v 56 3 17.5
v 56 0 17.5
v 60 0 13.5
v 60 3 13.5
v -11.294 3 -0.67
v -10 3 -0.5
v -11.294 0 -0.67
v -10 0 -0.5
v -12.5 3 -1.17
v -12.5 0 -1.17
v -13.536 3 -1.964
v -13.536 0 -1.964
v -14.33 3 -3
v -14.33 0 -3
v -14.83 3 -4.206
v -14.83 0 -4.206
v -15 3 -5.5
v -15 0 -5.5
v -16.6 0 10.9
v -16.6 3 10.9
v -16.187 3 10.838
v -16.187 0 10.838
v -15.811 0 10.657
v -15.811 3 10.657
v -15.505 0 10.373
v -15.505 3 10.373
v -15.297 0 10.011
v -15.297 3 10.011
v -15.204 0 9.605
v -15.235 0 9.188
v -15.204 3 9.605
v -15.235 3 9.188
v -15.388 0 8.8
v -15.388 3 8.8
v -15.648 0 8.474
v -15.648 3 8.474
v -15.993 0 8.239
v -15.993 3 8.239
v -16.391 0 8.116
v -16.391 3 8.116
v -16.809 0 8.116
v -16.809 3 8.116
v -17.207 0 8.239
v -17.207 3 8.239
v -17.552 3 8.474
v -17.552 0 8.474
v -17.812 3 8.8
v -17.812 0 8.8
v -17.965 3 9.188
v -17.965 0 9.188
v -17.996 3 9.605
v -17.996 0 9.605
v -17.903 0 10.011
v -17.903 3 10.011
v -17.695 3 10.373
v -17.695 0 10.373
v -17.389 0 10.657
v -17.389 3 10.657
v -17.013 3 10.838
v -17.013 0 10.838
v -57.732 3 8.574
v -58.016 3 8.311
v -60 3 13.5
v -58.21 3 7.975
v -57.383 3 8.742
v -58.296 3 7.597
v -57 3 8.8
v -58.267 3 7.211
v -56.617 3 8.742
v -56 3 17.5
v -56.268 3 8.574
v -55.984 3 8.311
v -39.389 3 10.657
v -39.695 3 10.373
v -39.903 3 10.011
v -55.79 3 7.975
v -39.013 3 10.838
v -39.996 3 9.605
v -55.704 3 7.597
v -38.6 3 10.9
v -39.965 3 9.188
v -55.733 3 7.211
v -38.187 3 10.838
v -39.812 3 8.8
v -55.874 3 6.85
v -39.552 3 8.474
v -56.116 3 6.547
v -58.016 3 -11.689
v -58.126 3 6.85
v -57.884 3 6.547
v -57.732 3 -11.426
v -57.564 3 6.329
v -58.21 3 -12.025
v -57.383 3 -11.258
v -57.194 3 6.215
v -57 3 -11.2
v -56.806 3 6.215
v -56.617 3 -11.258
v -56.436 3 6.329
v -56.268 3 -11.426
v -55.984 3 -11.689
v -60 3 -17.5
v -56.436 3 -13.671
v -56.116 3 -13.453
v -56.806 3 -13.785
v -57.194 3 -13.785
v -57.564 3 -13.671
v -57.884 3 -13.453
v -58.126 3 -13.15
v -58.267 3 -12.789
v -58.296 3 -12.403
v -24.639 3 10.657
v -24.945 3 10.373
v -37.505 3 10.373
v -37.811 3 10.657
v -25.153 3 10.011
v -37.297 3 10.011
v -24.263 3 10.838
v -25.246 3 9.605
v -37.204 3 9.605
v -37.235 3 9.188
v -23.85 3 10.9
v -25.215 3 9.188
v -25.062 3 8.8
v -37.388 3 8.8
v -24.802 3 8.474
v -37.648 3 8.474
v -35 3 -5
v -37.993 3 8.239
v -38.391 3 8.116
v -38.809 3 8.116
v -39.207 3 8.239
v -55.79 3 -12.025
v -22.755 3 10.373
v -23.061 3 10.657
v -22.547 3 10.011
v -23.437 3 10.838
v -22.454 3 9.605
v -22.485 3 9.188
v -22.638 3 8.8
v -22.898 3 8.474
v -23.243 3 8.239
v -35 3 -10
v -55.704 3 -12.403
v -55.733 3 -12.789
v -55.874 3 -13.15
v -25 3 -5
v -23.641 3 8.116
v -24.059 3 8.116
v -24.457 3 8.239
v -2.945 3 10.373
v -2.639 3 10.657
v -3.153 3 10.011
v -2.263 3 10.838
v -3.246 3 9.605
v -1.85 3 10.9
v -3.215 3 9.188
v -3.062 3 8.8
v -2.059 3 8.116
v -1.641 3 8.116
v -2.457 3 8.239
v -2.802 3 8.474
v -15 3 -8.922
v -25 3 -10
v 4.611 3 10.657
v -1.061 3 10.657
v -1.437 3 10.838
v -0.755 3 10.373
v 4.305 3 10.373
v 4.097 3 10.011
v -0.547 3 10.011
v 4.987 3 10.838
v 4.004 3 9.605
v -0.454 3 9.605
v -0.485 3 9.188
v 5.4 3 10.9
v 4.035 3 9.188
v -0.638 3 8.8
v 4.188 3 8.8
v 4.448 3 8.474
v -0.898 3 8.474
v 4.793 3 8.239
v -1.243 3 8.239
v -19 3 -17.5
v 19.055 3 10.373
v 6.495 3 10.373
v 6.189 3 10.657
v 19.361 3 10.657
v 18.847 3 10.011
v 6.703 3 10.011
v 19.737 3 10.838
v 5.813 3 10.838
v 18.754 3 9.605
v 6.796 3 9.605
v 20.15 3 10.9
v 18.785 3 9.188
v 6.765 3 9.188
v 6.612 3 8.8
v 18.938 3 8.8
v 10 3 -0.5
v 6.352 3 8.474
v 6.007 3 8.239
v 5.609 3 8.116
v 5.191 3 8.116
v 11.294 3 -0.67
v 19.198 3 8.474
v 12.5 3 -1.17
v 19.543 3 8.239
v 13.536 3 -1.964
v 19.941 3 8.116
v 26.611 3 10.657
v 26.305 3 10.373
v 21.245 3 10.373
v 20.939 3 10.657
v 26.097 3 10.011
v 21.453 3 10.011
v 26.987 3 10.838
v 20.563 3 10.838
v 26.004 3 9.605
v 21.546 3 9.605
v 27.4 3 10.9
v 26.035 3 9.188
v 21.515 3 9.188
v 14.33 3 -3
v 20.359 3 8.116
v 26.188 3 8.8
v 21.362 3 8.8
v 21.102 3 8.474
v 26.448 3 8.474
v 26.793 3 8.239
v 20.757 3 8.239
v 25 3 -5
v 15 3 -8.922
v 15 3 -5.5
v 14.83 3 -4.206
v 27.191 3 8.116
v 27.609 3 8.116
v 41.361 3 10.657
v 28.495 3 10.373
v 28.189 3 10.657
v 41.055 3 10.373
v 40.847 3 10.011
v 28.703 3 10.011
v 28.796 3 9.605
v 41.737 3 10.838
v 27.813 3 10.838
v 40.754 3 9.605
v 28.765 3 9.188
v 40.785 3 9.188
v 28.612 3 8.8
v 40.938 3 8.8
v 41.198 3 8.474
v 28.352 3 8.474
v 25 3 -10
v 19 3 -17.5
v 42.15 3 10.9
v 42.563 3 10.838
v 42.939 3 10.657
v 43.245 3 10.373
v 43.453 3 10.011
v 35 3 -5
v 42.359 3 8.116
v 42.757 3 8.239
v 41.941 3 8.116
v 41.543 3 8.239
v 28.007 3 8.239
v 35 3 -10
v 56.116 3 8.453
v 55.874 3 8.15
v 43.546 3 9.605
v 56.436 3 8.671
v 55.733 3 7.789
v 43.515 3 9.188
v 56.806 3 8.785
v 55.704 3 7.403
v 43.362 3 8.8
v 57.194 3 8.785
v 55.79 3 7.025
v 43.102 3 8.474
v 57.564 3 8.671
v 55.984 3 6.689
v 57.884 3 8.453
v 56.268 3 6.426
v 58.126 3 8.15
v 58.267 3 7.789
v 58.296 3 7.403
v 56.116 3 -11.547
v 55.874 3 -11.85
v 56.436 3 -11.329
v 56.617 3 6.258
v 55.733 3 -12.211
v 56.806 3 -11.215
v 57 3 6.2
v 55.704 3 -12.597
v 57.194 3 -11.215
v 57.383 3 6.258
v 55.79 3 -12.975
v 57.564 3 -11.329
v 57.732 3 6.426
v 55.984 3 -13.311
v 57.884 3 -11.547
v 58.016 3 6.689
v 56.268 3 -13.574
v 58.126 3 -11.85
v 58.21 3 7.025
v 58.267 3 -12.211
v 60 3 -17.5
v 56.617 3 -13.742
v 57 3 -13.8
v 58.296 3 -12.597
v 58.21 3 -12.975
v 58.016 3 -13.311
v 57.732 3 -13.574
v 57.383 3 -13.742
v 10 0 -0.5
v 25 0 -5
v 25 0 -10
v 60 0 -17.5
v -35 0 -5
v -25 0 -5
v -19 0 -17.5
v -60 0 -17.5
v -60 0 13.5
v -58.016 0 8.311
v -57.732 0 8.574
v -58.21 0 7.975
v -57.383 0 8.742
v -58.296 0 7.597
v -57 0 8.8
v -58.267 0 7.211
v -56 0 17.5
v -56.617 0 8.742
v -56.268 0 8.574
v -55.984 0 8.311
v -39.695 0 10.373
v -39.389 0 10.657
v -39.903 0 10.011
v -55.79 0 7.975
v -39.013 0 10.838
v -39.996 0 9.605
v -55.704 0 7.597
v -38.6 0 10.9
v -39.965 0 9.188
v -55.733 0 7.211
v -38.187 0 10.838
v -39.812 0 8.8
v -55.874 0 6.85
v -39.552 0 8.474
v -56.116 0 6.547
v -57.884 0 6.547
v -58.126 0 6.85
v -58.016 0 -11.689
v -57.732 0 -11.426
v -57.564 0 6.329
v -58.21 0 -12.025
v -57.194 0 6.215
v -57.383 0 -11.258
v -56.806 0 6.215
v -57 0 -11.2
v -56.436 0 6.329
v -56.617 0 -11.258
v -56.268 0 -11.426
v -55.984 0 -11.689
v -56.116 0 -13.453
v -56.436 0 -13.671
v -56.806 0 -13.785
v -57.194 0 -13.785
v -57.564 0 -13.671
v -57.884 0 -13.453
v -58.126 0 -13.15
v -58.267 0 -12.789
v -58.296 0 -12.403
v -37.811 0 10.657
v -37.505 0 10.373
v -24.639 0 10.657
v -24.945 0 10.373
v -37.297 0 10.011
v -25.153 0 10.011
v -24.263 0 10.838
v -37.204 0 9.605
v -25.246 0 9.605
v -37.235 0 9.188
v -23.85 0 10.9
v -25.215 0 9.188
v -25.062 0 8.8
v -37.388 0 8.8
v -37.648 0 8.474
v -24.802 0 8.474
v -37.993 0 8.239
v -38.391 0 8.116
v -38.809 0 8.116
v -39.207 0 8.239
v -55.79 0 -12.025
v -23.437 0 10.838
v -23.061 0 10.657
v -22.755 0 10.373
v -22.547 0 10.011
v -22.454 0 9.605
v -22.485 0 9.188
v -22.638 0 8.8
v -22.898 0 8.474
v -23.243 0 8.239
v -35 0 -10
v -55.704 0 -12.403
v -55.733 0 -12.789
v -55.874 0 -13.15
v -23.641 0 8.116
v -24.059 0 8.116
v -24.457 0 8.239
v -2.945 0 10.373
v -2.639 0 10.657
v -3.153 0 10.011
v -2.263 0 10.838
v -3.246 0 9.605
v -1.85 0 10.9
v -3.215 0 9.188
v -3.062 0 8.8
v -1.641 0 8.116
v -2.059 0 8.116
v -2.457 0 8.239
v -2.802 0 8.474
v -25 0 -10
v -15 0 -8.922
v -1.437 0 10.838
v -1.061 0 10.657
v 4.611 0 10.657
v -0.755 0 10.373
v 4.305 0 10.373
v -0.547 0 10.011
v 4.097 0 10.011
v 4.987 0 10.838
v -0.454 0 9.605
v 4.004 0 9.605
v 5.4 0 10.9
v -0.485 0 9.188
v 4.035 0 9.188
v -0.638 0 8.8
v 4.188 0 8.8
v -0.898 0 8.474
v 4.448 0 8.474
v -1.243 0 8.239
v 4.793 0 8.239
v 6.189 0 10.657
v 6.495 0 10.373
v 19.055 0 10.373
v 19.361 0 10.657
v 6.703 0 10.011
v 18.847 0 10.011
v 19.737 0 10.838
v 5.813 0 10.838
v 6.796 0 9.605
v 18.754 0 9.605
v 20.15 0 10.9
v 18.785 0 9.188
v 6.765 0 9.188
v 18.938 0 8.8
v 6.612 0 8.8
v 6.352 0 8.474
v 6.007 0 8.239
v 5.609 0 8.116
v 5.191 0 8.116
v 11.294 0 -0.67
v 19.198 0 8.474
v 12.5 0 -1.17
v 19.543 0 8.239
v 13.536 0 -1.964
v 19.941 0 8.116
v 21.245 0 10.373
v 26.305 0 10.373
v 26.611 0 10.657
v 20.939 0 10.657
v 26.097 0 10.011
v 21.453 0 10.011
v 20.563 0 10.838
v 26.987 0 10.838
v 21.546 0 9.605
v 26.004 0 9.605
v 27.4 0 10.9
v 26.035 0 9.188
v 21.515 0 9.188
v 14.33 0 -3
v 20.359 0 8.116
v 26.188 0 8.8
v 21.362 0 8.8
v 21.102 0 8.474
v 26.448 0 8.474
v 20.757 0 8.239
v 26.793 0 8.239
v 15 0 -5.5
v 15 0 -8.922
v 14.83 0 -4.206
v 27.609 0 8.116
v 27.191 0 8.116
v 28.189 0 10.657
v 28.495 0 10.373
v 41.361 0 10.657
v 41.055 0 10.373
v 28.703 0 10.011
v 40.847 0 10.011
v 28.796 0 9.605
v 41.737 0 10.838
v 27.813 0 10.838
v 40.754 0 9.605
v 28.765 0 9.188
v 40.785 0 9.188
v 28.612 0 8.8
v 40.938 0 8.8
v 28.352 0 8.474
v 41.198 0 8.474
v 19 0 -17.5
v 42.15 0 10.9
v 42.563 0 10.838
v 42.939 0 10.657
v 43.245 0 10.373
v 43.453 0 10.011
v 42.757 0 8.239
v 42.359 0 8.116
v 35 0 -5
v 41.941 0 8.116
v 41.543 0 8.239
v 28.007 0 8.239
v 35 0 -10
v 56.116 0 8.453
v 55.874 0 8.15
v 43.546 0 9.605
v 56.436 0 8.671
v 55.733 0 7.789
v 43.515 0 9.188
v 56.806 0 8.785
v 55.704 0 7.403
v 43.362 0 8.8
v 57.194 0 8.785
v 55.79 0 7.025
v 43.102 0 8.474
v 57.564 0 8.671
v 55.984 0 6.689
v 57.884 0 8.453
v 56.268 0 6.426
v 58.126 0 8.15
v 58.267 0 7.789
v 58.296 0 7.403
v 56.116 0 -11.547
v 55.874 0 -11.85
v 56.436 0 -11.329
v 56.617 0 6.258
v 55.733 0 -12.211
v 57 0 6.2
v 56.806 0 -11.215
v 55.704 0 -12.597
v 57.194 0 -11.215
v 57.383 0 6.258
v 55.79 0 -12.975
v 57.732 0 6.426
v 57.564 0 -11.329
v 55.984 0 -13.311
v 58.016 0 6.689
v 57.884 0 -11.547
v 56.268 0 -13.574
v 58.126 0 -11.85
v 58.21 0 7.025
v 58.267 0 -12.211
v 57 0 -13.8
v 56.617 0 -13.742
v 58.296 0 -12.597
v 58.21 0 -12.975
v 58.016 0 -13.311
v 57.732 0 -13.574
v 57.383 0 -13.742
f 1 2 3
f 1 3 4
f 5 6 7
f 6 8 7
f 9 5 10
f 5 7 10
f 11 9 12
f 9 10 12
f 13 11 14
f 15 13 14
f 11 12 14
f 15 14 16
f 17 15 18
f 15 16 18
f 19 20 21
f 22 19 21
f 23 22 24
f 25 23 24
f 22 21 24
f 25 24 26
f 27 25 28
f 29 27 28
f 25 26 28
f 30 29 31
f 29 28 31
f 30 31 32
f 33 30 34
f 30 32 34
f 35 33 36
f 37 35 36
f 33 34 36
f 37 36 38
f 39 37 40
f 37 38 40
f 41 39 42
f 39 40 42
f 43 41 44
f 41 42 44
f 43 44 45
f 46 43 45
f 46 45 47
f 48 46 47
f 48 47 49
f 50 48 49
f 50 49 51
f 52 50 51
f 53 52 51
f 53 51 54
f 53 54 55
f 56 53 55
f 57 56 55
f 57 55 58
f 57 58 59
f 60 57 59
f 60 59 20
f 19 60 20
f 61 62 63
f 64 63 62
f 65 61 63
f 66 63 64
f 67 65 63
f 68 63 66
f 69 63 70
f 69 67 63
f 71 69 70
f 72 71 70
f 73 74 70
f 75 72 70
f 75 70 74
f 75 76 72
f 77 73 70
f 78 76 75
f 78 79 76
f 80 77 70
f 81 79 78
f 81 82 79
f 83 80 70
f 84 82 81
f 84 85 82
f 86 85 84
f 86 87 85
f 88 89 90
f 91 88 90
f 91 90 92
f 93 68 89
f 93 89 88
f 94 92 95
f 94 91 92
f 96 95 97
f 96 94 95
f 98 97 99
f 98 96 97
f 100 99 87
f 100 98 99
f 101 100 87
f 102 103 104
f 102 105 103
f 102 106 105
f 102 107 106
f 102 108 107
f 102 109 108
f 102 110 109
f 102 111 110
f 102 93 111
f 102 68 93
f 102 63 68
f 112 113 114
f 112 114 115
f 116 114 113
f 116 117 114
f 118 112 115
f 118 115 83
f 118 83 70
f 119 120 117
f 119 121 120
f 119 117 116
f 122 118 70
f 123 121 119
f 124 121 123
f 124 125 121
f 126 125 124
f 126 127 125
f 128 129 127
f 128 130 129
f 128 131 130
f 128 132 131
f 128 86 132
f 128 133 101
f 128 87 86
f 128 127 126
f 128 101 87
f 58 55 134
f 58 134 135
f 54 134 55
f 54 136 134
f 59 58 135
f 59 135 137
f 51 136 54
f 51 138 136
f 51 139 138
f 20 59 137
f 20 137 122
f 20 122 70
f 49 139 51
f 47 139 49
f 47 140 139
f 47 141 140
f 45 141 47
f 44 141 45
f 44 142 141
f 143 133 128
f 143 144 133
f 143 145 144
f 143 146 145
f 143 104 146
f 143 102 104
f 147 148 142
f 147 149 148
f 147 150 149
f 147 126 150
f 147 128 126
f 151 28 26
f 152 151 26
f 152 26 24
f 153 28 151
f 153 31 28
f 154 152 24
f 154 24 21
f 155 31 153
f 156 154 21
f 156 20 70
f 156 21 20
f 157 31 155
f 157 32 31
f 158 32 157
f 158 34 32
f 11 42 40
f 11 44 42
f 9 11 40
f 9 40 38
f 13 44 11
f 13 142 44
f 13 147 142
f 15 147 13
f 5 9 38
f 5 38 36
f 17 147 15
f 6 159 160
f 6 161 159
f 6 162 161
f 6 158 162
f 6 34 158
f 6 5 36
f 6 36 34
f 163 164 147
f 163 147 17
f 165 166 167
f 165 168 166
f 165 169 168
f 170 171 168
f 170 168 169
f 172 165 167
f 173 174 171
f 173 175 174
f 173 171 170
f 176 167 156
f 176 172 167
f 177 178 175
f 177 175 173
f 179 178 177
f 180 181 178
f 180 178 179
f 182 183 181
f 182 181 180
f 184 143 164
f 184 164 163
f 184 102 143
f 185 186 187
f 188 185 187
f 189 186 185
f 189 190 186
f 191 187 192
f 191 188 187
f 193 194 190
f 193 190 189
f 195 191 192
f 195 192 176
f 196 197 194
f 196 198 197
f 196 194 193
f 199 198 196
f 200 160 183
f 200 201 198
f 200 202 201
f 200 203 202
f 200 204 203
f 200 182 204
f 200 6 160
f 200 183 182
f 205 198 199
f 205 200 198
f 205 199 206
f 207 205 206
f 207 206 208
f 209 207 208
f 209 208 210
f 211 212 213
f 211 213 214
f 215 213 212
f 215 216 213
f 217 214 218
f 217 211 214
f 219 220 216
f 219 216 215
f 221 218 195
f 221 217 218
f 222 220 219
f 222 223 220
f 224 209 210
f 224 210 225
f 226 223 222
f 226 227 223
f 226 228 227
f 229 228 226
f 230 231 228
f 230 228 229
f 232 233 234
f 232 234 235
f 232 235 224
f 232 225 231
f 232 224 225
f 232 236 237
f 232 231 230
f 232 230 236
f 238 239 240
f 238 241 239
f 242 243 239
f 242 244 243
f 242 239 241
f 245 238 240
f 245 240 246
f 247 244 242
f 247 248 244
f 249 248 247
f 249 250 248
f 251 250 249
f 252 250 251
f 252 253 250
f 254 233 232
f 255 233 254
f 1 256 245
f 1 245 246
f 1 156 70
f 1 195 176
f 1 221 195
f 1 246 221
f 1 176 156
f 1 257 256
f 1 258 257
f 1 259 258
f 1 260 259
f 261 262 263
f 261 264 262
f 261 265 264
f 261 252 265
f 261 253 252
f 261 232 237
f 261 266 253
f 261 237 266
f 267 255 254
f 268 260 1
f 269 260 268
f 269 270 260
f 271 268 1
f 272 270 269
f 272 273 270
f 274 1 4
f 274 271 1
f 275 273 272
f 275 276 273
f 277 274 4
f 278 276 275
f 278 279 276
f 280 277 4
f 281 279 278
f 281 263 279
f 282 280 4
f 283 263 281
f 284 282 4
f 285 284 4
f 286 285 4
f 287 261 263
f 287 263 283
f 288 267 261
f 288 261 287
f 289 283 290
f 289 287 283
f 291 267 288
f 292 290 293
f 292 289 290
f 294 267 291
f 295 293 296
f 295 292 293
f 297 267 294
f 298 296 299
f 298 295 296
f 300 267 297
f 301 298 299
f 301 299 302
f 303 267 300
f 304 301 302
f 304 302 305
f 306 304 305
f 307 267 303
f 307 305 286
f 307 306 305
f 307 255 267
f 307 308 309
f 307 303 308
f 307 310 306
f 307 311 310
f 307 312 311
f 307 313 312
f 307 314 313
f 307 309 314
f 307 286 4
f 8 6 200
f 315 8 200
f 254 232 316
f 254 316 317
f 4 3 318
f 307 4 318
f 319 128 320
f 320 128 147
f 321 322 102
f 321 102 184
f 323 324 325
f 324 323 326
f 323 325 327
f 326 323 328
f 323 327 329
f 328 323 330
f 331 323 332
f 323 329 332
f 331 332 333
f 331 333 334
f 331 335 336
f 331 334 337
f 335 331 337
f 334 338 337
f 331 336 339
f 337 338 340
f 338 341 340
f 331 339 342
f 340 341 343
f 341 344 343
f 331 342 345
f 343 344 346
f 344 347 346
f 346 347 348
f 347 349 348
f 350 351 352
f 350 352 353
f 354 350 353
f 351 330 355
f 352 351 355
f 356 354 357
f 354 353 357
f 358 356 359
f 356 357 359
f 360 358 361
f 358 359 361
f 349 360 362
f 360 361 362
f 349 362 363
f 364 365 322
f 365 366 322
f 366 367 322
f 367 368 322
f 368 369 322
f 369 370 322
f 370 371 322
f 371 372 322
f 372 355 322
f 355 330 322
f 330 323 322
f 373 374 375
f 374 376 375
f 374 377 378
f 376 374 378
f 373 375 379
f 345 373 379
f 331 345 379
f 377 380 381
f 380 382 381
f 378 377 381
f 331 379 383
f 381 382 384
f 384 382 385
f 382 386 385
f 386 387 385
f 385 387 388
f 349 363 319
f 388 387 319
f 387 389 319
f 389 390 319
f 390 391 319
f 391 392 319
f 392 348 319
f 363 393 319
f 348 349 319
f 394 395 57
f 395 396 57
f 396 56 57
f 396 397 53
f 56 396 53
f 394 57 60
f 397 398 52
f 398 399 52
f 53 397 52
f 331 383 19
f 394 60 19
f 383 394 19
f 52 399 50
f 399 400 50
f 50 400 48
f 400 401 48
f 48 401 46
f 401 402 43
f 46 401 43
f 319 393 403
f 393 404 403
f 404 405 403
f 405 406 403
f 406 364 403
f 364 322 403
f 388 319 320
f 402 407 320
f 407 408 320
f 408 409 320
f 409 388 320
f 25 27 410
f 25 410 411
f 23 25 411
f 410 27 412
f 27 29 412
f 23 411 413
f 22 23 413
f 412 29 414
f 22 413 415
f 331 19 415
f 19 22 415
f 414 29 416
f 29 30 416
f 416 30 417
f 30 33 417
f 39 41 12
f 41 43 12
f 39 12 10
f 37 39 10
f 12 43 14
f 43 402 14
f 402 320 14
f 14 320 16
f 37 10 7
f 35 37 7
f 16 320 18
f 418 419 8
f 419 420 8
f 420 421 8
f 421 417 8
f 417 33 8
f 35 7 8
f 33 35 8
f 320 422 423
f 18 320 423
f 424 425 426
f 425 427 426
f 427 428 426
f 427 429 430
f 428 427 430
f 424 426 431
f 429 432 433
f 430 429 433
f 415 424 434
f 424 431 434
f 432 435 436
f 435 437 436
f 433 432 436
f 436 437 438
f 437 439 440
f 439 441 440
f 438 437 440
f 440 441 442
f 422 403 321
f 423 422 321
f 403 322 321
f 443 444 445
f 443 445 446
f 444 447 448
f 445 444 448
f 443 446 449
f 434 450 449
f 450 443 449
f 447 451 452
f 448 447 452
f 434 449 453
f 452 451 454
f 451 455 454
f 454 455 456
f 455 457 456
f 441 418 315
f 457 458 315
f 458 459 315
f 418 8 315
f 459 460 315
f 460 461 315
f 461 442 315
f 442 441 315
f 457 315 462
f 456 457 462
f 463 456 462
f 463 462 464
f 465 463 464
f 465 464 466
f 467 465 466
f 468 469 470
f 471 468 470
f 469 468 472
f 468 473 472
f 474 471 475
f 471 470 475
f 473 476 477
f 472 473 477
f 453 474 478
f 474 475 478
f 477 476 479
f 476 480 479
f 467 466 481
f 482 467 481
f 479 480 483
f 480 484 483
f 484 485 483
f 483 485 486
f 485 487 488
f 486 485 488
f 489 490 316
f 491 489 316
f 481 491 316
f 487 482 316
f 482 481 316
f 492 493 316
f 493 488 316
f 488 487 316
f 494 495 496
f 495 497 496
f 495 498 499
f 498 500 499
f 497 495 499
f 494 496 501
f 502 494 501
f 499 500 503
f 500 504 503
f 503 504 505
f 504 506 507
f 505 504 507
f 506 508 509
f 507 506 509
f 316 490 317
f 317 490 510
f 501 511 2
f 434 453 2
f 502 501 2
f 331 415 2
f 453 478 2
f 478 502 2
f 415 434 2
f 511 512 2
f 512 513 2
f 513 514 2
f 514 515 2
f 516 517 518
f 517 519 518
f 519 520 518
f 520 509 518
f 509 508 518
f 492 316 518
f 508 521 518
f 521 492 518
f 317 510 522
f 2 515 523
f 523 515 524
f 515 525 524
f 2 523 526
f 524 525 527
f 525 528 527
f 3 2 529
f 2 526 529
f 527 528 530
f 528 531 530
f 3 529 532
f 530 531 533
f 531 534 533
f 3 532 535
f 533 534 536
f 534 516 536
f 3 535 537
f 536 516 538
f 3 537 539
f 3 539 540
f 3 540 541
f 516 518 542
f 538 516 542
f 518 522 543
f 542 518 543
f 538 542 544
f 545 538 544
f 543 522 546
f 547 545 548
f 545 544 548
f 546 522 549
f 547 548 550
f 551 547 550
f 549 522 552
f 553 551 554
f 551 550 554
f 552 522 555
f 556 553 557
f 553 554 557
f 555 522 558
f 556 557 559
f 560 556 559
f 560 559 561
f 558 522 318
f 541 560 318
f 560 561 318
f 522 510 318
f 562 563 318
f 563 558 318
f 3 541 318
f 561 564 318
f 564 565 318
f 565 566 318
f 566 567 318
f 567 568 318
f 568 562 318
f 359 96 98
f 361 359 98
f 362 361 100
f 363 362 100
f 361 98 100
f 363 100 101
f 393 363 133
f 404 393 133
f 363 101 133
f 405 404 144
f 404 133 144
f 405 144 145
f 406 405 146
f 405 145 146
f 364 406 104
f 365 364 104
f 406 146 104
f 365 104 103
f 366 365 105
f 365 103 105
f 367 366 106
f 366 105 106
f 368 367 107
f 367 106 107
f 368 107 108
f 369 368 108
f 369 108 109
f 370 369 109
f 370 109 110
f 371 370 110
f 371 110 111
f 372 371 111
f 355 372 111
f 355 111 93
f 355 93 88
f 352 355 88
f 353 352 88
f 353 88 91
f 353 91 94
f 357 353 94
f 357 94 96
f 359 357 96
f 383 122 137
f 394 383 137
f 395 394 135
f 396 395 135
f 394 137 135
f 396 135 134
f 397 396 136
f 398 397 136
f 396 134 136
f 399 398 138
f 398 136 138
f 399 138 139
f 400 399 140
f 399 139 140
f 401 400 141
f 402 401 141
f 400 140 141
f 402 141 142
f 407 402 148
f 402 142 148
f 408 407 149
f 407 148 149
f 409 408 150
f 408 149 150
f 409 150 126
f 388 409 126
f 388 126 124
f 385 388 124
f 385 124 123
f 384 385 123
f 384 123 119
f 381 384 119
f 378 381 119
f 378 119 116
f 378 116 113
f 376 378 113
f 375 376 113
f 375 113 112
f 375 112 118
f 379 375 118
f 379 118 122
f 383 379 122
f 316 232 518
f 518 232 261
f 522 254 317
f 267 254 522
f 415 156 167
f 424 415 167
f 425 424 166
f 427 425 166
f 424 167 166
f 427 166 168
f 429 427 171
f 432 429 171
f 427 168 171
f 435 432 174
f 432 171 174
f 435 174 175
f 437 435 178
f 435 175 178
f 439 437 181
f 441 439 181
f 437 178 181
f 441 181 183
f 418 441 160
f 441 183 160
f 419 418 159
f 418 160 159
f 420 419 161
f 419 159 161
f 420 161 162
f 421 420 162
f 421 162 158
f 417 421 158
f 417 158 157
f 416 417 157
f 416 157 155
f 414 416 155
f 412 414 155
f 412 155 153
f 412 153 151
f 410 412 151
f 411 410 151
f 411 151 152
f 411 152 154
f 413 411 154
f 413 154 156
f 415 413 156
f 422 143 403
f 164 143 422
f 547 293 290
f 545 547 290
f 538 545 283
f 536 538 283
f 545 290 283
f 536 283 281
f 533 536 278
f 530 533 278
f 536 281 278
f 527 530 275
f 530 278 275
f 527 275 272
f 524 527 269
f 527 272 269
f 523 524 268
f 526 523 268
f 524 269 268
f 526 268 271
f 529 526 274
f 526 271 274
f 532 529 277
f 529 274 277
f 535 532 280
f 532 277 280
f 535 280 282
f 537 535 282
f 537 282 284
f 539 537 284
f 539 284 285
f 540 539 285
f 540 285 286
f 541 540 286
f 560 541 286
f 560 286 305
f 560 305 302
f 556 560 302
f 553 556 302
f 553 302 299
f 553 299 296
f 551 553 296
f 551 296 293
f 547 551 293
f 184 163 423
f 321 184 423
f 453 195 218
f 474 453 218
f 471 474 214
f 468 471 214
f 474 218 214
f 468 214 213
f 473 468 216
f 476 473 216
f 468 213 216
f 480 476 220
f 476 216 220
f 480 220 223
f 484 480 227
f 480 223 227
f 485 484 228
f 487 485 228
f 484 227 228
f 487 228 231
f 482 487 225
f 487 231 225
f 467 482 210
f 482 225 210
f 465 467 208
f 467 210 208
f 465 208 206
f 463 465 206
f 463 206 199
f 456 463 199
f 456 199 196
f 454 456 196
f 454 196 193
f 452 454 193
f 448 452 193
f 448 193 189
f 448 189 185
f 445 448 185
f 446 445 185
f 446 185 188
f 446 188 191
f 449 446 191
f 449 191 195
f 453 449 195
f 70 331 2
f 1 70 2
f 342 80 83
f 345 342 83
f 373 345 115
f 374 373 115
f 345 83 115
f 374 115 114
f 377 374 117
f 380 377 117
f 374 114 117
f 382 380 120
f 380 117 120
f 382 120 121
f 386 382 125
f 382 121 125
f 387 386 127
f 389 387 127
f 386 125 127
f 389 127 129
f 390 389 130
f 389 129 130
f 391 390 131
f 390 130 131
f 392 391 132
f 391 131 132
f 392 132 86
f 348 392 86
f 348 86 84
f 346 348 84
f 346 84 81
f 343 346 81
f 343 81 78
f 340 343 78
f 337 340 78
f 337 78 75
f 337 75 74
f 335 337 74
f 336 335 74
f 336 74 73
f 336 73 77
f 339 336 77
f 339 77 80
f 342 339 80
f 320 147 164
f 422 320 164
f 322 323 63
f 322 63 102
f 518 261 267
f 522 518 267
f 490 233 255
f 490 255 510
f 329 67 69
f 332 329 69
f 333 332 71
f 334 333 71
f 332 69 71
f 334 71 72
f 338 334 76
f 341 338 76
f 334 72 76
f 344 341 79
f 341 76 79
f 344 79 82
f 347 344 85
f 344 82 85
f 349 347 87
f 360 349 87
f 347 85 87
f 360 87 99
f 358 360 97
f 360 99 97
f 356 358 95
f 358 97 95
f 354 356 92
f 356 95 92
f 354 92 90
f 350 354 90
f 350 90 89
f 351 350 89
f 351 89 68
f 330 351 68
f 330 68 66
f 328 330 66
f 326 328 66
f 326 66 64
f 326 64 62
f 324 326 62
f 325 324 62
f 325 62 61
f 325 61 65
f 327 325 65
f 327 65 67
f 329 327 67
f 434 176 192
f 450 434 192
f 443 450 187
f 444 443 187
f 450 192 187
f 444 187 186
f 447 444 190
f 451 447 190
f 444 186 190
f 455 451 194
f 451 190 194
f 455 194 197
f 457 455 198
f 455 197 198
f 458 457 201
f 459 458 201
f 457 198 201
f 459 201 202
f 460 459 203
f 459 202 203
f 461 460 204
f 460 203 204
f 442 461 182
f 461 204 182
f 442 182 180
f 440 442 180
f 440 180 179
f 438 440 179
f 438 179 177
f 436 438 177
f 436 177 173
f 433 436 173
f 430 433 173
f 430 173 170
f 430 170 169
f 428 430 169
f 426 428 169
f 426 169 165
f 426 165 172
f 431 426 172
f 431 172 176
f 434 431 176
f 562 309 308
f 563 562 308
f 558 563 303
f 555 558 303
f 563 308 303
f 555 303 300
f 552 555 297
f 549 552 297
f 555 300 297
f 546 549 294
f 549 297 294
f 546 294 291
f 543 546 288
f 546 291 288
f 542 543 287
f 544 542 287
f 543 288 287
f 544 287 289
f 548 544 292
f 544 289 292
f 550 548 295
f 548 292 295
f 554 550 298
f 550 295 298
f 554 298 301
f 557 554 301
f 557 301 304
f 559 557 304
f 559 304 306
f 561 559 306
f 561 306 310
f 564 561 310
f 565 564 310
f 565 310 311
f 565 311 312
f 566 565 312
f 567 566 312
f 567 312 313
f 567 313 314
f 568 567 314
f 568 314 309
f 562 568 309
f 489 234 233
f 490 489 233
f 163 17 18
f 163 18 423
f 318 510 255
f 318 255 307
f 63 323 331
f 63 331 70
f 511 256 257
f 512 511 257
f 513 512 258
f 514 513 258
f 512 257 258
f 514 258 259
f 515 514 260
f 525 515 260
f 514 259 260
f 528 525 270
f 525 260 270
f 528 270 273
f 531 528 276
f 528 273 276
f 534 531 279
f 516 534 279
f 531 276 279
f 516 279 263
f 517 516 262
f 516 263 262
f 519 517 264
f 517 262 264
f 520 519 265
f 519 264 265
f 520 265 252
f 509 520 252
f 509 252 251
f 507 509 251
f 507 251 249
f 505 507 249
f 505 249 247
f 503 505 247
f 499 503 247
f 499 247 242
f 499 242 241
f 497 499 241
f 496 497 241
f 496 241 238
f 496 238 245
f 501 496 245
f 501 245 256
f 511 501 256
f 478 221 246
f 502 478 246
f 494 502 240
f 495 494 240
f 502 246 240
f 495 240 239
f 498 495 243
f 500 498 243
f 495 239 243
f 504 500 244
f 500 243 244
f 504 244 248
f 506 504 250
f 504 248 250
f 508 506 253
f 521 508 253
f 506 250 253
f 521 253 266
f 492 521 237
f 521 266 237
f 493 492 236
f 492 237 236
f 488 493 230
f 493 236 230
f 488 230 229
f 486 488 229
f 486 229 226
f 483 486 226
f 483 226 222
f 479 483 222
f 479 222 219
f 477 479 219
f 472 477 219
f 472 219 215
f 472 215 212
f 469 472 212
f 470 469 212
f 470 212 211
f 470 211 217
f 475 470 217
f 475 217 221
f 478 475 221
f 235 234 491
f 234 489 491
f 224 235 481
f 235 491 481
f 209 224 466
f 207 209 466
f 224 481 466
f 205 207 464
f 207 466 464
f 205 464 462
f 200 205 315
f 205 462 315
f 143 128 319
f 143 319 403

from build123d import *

# Parameters (mm, degrees)
SKETCH_1_W          = 120
SKETCH_1_H          = 35
EXTRUDE_1_DEPTH     = 3
SKETCH_2_W          = 30
SKETCH_2_H          = 17
CUT_EXTRUDE_1_DEPTH = 63.571958576
SKETCH_3_R          = 1.3
CUT_EXTRUDE_2_DEPTH = 63.571958576
SKETCH_4_R          = 1.4
CUT_EXTRUDE_3_DEPTH = 63.571958576
SKETCH_5_W          = 10
SKETCH_5_H          = 5
CUT_EXTRUDE_4_DEPTH = 63.571958576
CHAMFER_1_SIZE      = 4
CHAMFER_1_SIZE2     = 8.578027682
CHAMFER_2_SIZE      = 4
CHAMFER_2_SIZE2     = 8.578027682
FILLET_1_R          = 5
CHAMFER_3_SIZE      = 4


with BuildPart() as part:
    # 草图1 → 凸台-拉伸1 (new body)
    with BuildSketch(Plane(origin=(0, 0, 0), x_dir=(1, 0, 0), z_dir=(0, 1, 0))):
        Rectangle(SKETCH_1_W, SKETCH_1_H)
    extrude(amount=EXTRUDE_1_DEPTH)

    # 草图2 → 切除-拉伸1 (cut, through all)
    with BuildSketch(Plane(origin=(0, 3, 0), x_dir=(1, 0, 0), z_dir=(0, 1, 0))):
        with Locations((0, 9)):
            Rectangle(SKETCH_2_W, SKETCH_2_H)
    extrude(amount=-CUT_EXTRUDE_1_DEPTH, mode=Mode.SUBTRACT)

    # 草图3 → 切除-拉伸2 (cut, through all)
    with BuildSketch(Plane(origin=(0, 3, 0), x_dir=(1, 0, 0), z_dir=(0, 1, 0))):
        with Locations(Location((-57, 12.5, 0), (0, 0, 270))):
            Circle(SKETCH_3_R)
        with Locations(Location((-57, -7.5, 0), (0, 0, 270))):
            Circle(SKETCH_3_R)
        with Locations(Location((57, -7.5, 0), (0, 0, 90))):
            Circle(SKETCH_3_R)
        with Locations(Location((57, 12.5, 0), (0, 0, 90))):
            Circle(SKETCH_3_R)
    extrude(amount=-CUT_EXTRUDE_2_DEPTH, mode=Mode.SUBTRACT)

    # 草图4 → 切除-拉伸3 (cut, through all)
    with BuildSketch(Plane(origin=(0, 3, 0), x_dir=(1, 0, 0), z_dir=(0, 1, 0))):
        with Locations(Location((5.4, -9.5, 0), (0, 0, 270))):
            Circle(SKETCH_4_R)
        with Locations(Location((20.15, -9.5, 0), (0, 0, 270))):
            Circle(SKETCH_4_R)
        with Locations(Location((27.4, -9.5, 0), (0, 0, 270))):
            Circle(SKETCH_4_R)
        with Locations(Location((42.15, -9.5, 0), (0, 0, 270))):
            Circle(SKETCH_4_R)
        with Locations(Location((-1.85, -9.5, 0), (0, 0, 270))):
            Circle(SKETCH_4_R)
        with Locations(Location((-16.6, -9.5, 0), (0, 0, 270))):
            Circle(SKETCH_4_R)
        with Locations(Location((-23.85, -9.5, 0), (0, 0, 270))):
            Circle(SKETCH_4_R)
        with Locations(Location((-38.6, -9.5, 0), (0, 0, 270))):
            Circle(SKETCH_4_R)
    extrude(amount=-CUT_EXTRUDE_3_DEPTH, mode=Mode.SUBTRACT)

    # 草图5 → 切除-拉伸4 (cut, through all)
    with BuildSketch(Plane(origin=(0, 3, 0), x_dir=(1, 0, 0), z_dir=(0, 1, 0))):
        with Locations((-30, 7.5)):
            Rectangle(SKETCH_5_W, SKETCH_5_H)
        with Locations((30, 7.5)):
            Rectangle(SKETCH_5_W, SKETCH_5_H)
    extrude(amount=-CUT_EXTRUDE_4_DEPTH, mode=Mode.SUBTRACT)

    # 倒角1
    chamfer_1_edges = [part.edges().sort_by_distance(p)[0] for p in [
        (-15, 1.5, -17.5),
    ]]
    chamfer_1_side = [part.faces().sort_by_distance(p)[0] for p in [
        (-37.5, 1.5, -17.5),
    ]]
    chamfer(chamfer_1_edges, length=CHAMFER_1_SIZE, length2=CHAMFER_1_SIZE2, reference=chamfer_1_side[0])

    # 倒角2
    chamfer_2_edges = [part.edges().sort_by_distance(p)[0] for p in [
        (15, 1.5, -17.5),
    ]]
    chamfer_2_side = [part.faces().sort_by_distance(p)[0] for p in [
        (37.5, 1.5, -17.5),
    ]]
    chamfer(chamfer_2_edges, length=CHAMFER_2_SIZE, length2=CHAMFER_2_SIZE2, reference=chamfer_2_side[0])

    # 圆角1
    fillet_1_edges = [part.edges().sort_by_distance(p)[0] for p in [
        (-15, 1.5, -0.5),
        (15, 1.5, -0.5),
    ]]
    fillet(fillet_1_edges, radius=FILLET_1_R)

    # 倒角3
    chamfer_3_edges = [part.edges().sort_by_distance(p)[0] for p in [
        (60, 1.5, 17.5),
        (-60, 1.5, 17.5),
    ]]
    chamfer(chamfer_3_edges, length=CHAMFER_3_SIZE)


solid = part.part
